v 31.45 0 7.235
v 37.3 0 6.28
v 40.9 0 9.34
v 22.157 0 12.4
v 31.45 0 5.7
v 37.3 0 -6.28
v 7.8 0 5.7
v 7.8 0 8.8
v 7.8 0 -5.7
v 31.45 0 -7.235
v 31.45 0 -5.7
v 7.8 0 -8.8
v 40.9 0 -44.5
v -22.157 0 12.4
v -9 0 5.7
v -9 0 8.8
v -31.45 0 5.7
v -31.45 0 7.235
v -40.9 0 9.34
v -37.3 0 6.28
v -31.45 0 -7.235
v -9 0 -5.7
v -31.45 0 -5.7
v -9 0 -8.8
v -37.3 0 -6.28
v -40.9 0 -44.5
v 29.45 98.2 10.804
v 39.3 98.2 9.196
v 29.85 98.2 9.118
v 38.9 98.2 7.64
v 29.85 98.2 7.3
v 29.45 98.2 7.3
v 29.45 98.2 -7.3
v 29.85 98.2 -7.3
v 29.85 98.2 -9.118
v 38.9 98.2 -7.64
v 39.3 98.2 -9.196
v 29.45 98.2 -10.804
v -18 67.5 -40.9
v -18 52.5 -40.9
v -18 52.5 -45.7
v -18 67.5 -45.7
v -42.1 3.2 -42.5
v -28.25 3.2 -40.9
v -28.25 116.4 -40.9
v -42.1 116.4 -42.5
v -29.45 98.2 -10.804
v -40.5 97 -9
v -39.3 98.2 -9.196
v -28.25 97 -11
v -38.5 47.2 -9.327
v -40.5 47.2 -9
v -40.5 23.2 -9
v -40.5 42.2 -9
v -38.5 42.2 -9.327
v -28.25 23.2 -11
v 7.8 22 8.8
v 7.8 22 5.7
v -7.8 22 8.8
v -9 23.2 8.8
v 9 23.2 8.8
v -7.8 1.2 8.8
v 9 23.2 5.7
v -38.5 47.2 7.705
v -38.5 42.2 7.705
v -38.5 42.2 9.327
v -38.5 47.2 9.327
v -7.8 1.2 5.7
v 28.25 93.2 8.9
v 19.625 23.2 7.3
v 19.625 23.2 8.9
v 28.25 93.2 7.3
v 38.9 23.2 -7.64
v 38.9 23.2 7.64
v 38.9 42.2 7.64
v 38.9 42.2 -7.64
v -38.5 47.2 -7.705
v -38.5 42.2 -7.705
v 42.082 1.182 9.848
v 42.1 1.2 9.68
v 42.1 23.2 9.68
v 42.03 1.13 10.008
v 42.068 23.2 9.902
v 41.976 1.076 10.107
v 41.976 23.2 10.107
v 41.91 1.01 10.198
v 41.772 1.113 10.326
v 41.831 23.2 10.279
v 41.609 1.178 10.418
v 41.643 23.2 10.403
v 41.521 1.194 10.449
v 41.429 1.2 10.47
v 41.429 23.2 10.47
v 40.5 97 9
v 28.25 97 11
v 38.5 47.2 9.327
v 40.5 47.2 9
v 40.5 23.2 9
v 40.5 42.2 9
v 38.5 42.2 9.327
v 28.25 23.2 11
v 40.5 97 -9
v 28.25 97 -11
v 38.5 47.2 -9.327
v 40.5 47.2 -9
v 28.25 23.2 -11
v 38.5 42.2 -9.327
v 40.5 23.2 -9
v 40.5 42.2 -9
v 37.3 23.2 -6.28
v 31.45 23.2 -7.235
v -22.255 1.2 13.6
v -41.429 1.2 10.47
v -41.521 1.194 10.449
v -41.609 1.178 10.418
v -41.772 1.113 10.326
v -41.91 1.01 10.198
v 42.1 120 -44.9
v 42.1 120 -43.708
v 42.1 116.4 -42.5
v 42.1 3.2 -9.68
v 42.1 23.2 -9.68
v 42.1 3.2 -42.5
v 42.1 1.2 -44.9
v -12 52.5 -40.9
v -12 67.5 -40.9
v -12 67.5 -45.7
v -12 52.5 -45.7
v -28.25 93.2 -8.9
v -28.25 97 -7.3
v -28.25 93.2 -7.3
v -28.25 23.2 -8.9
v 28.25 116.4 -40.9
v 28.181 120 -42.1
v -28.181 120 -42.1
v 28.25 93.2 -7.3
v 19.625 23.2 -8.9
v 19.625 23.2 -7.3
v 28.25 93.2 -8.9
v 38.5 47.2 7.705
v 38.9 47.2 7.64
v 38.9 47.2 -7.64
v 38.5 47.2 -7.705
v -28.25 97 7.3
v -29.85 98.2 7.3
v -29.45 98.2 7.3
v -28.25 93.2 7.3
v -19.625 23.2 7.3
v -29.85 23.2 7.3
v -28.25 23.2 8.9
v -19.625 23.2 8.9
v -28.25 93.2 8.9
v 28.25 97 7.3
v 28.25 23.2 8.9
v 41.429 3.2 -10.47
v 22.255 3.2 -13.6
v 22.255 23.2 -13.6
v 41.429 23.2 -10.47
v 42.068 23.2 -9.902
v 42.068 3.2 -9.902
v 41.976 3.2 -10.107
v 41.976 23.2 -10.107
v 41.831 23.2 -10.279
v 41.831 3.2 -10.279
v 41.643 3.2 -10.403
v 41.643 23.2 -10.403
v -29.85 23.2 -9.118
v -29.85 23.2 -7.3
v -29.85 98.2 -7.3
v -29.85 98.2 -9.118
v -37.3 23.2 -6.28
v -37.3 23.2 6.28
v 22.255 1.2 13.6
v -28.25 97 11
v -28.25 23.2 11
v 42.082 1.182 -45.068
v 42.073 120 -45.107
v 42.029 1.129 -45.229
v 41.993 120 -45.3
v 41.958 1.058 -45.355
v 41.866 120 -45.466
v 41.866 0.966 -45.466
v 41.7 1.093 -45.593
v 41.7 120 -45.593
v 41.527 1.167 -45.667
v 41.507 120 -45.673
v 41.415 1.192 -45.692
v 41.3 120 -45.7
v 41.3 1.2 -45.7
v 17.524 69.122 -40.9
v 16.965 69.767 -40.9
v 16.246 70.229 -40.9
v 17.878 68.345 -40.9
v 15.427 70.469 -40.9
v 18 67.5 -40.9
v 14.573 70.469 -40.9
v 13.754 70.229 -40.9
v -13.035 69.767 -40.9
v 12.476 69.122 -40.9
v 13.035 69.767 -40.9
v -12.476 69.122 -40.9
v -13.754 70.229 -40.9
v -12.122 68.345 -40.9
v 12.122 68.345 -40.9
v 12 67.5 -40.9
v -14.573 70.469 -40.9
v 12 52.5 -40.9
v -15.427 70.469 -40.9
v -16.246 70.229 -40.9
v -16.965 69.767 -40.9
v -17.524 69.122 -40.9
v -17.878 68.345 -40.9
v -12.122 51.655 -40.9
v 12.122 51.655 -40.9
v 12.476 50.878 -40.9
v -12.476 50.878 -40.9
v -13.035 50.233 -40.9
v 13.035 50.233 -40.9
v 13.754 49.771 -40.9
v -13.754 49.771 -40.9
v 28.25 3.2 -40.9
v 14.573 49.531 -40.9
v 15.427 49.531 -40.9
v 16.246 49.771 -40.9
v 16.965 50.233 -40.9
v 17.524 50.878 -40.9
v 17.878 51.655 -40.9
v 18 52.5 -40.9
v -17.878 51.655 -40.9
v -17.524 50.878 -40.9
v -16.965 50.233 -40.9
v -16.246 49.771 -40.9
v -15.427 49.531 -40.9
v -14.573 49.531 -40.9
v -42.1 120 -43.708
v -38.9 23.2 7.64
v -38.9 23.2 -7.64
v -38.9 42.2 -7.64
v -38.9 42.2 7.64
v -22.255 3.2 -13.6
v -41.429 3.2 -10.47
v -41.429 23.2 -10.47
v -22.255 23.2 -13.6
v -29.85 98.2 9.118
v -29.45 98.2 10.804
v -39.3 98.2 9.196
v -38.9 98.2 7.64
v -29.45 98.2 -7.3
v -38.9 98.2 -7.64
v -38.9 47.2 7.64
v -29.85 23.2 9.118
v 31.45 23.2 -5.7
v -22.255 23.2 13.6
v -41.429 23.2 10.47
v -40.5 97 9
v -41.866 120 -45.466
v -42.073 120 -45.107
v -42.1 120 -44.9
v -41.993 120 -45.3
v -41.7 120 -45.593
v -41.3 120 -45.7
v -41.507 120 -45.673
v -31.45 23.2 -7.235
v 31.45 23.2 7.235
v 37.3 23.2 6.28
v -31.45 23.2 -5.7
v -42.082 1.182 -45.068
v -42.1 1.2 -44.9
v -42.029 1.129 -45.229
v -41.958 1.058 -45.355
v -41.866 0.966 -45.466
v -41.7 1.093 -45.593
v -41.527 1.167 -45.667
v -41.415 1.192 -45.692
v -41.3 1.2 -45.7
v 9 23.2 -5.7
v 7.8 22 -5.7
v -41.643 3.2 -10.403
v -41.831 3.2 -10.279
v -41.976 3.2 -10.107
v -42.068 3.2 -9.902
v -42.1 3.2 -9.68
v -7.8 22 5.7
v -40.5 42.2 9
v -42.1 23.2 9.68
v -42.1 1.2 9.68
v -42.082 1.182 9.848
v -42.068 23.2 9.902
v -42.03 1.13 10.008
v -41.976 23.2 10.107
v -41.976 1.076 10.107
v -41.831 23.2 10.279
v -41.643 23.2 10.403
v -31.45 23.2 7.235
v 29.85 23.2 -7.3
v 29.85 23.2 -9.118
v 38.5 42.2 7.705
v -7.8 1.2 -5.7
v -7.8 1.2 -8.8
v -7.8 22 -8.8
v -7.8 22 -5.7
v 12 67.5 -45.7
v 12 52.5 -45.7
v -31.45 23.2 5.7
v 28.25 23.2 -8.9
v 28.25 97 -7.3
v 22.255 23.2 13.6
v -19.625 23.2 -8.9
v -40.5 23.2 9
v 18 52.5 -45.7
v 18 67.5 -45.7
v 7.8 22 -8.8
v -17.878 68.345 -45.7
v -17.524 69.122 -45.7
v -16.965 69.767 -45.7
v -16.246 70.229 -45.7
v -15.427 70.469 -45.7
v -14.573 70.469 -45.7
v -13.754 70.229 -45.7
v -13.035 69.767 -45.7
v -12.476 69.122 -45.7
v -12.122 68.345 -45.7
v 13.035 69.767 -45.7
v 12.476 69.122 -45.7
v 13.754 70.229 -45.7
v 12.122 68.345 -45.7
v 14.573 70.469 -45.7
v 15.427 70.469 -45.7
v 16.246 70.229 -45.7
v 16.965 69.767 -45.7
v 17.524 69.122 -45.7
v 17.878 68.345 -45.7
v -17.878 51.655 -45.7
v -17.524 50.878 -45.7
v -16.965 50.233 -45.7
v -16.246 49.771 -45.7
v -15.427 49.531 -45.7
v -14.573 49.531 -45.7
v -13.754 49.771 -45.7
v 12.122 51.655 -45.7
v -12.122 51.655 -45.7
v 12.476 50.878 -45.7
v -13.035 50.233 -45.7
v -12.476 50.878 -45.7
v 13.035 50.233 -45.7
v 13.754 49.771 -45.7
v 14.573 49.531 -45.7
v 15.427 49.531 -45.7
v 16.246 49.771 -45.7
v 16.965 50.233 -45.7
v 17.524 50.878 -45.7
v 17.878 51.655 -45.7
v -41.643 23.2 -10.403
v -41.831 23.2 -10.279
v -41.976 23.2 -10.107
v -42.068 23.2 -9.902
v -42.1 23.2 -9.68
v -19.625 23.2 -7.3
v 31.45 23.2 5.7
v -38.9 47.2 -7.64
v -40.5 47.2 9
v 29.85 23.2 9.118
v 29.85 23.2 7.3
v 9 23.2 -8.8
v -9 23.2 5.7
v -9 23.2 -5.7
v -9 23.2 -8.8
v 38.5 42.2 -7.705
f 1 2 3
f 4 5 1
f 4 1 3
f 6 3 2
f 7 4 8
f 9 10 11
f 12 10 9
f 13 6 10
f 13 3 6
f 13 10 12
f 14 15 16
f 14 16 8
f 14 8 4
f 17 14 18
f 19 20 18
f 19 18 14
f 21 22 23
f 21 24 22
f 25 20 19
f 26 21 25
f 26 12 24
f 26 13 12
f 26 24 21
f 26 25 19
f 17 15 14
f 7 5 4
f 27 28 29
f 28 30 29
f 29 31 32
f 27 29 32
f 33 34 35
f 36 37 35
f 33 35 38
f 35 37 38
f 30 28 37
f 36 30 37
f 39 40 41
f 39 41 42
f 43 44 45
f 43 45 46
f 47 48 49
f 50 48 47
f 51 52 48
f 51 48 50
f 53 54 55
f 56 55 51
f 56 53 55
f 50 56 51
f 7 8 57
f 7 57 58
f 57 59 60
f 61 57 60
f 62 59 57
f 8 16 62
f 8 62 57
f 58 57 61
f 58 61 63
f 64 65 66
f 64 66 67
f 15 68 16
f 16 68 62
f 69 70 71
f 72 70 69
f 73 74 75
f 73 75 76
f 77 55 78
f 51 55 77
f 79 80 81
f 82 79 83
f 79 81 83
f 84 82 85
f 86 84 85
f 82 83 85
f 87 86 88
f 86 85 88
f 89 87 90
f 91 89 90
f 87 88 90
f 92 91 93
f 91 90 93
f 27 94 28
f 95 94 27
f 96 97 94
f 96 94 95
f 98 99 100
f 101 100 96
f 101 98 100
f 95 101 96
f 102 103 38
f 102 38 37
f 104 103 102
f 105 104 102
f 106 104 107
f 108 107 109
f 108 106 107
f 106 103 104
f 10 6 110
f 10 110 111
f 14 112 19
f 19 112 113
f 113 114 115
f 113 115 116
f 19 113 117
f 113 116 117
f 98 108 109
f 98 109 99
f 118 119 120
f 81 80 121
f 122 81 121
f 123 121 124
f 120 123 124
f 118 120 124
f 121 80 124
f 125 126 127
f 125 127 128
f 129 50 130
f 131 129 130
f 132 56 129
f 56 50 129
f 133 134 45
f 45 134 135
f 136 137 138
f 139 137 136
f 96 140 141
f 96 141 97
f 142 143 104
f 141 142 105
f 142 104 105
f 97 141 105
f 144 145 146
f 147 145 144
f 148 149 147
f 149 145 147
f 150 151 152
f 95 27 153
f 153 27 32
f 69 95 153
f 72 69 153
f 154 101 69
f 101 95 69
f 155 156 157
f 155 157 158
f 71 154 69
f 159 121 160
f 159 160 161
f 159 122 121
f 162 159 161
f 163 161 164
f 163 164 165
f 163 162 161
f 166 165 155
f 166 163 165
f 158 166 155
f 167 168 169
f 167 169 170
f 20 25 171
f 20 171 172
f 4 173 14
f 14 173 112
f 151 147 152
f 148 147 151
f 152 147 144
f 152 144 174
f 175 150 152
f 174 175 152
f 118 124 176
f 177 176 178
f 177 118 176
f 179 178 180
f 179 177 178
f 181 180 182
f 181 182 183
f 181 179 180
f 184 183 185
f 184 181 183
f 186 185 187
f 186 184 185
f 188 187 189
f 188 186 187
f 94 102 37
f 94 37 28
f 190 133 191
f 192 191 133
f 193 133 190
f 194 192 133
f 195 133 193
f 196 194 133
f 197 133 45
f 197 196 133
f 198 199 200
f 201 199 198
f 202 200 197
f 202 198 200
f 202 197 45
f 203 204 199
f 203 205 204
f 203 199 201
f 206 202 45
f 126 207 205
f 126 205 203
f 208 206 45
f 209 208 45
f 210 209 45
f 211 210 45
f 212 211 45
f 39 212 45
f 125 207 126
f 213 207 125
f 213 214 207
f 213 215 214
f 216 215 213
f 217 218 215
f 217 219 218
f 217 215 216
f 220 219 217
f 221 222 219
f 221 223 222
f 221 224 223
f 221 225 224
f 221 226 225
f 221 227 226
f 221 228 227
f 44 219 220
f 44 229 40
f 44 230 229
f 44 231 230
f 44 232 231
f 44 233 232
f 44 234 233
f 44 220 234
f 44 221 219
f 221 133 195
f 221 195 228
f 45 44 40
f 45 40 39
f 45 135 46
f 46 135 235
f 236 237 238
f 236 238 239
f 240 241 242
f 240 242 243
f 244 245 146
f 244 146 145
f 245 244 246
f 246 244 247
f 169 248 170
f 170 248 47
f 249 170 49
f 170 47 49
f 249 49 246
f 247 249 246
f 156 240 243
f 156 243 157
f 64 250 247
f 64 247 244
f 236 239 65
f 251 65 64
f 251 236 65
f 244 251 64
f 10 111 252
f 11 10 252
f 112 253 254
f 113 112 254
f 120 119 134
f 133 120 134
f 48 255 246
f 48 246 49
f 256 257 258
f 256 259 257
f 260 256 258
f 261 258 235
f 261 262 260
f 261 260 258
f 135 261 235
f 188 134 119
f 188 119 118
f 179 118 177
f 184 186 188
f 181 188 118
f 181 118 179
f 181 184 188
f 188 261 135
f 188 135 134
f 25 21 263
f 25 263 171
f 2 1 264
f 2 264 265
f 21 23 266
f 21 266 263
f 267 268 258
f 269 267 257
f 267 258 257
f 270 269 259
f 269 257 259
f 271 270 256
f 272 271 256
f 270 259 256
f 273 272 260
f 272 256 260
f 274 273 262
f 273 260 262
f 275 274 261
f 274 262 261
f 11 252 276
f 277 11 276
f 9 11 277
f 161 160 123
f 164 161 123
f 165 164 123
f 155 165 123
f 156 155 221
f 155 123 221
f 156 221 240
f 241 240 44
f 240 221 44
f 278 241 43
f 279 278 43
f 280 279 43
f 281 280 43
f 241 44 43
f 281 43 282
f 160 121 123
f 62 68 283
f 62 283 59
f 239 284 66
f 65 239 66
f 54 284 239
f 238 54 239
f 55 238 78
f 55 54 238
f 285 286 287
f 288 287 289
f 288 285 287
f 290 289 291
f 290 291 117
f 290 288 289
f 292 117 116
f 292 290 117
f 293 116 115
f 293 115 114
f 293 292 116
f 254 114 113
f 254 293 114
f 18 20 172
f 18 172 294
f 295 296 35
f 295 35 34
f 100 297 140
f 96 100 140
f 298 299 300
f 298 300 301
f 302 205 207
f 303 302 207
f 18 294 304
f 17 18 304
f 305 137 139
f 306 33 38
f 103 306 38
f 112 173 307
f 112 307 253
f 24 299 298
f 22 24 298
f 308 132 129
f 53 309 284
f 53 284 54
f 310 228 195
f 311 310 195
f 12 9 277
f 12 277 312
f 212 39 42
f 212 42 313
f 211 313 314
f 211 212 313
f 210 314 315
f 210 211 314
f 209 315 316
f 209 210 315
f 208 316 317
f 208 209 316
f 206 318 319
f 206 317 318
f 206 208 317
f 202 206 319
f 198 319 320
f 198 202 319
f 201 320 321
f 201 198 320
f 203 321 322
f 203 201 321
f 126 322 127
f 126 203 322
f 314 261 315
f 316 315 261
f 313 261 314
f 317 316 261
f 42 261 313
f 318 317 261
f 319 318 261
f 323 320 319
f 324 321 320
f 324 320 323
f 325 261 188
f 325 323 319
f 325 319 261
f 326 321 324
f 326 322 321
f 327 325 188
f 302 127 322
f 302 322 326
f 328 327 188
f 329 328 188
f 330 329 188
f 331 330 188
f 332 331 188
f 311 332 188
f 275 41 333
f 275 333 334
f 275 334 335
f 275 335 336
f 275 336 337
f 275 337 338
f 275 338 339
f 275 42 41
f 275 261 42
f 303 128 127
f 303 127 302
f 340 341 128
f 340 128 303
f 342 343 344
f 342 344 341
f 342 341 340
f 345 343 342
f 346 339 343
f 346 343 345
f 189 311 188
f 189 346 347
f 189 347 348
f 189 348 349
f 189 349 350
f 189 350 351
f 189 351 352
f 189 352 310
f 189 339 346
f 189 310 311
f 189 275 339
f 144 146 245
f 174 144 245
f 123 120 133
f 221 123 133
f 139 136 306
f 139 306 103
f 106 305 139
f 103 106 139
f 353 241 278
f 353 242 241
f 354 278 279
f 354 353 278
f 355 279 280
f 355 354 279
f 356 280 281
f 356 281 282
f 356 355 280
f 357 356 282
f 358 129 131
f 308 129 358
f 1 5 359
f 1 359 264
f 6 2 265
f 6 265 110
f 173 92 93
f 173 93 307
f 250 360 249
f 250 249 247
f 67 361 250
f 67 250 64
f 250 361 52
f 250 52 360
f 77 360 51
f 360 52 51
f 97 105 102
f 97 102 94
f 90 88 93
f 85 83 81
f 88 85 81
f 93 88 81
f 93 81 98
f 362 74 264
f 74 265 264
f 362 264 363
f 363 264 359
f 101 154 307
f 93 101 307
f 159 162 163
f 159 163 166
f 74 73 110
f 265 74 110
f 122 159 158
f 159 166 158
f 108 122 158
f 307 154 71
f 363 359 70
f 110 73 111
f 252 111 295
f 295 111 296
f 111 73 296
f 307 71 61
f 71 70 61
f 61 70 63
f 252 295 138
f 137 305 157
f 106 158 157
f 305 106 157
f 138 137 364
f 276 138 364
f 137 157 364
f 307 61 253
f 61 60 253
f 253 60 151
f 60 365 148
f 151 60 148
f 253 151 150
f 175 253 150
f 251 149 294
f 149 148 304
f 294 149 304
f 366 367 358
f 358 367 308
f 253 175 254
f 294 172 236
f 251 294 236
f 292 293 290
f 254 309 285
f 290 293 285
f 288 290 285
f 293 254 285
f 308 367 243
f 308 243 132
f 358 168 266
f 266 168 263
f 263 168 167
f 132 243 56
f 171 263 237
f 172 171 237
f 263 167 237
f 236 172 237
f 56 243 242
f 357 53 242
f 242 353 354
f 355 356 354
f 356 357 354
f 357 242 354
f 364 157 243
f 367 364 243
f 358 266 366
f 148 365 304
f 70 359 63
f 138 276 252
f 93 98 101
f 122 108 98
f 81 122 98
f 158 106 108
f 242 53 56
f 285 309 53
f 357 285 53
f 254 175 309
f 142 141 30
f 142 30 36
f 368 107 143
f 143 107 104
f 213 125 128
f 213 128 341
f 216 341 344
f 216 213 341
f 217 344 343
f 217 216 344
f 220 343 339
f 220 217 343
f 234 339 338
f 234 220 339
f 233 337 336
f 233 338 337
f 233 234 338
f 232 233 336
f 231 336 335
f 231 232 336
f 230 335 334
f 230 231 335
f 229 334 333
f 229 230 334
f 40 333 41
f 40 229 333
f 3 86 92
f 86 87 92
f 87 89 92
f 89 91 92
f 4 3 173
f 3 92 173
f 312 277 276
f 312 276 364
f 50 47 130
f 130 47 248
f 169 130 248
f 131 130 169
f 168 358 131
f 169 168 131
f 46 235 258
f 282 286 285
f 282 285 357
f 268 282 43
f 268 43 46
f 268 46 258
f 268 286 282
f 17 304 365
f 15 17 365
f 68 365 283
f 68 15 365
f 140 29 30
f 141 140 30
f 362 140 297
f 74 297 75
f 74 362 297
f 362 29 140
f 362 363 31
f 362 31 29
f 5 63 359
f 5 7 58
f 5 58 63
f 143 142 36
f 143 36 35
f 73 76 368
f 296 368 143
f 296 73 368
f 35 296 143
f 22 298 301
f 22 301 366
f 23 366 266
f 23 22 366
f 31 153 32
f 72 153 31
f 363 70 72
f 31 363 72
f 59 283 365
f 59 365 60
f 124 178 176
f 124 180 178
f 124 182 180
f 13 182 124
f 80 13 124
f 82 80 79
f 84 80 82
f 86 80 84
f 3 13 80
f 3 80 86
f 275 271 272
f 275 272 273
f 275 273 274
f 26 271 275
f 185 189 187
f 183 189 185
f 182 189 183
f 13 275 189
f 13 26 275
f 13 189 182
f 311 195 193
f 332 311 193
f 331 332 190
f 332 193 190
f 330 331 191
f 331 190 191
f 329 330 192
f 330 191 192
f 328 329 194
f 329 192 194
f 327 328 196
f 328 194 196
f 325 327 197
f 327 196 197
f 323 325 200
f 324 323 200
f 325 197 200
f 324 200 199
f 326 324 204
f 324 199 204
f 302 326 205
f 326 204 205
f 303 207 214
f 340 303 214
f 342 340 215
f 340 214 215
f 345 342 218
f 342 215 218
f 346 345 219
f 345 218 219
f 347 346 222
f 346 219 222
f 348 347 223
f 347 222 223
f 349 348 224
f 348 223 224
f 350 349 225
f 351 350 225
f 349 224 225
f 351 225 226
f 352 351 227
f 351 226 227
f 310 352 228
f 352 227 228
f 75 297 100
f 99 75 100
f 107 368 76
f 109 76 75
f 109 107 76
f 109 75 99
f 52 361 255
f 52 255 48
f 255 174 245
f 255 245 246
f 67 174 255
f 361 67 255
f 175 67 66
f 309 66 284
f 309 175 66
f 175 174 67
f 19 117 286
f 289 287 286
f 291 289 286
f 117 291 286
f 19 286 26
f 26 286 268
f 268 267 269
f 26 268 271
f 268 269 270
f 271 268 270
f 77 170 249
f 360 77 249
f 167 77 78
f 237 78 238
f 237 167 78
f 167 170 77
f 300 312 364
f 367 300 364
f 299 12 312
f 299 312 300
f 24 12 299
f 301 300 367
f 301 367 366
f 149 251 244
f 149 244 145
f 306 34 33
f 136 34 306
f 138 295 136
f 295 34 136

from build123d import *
from OCP.BRepFilletAPI import BRepFilletAPI_MakeChamfer

# Parameters (mm, degrees)
BOSS_EXTRUDE1_DEPTH     = 23.2
BOSS_EXTRUDE2_START     = 23.2
BOSS_EXTRUDE2_DEPTH     = 75
CUT_EXTRUDE1_DEPTH      = 108.706127959
CUT_EXTRUDE1_DEPTH_BACK = 108.706127959
SKETCH2_W               = 2
SKETCH2_H               = 5
CUT_EXTRUDE2_DEPTH      = 108.706127959
CUT_EXTRUDE2_DEPTH_BACK = 108.706127959
CUT_EXTRUDE3_DEPTH      = 108.706127959
CUT_EXTRUDE3_DEPTH_BACK = 108.706127959
BOSS_EXTRUDE3_DEPTH     = 3.2
SKETCH5_W               = 84.2
SKETCH5_H               = 3.2
BOSS_EXTRUDE4_DEPTH     = 120
BOSS_EXTRUDE5_DEPTH     = 120
CUT_EXTRUDE4_DEPTH      = 136.132897549
CUT_EXTRUDE4_DEPTH_BACK = 136.132897549
CHAMFER1_SIZE           = 3.6
CHAMFER1_SIZE2          = 1.2
CHAMFER2_SIZE           = 1.2
FILLET1_R               = 0.8


with BuildPart() as part:
    # Sketch1 → Boss-Extrude1 (new body)
    with BuildSketch(Plane(origin=(0, 0, 0), x_dir=(1, 0, 0), z_dir=(0, 1, 0))):
        Polygon((-22.25475327, 13.6), (22.25475327, 13.6), (42.1, 10.359959718), (42.1, -10.359959718), (22.25475327, -13.6), (-22.25475327, -13.6), (-42.1, -10.359959718), (-42.1, 10.359959718), align=None)
    extrude(amount=BOSS_EXTRUDE1_DEPTH)

    # Sketch1<3> → Boss-Extrude2 (add)
    with BuildSketch(Plane(origin=(0, 0, 0), x_dir=(1, 0, 0), z_dir=(0, 1, 0)).offset(BOSS_EXTRUDE2_START)):
        Polygon((40.5, -9), (28.25, -11), (28.25, -8.9), (11, -8.9), (11, -12), (-11, -12), (-11, -8.9), (-28.25, -8.9), (-28.25, -11), (-40.5, -9), (-40.5, 9), (-28.25, 11), (-28.25, 8.9), (-11, 8.9), (-11, 12), (11, 12), (11, 8.9), (28.25, 8.9), (28.25, 11), (40.5, 9), align=None)
        Polygon((-38.9, -7.640040282), (-29.85, -9.117591303), (-29.85, -7.3), (-9.4, -7.3), (-9.4, -10.4), (9.4, -10.4), (9.4, -7.3), (29.85, -7.3), (29.85, -9.117591303), (38.9, -7.640040282), (38.9, 7.640040282), (29.85, 9.117591303), (29.85, 7.3), (9.4, 7.3), (9.4, 10.4), (-9.4, 10.4), (-9.4, 7.3), (-29.85, 7.3), (-29.85, 9.117591303), (-38.9, 7.640040282), align=None, mode=Mode.SUBTRACT)
    extrude(amount=BOSS_EXTRUDE2_DEPTH)

    # Sketch2 → Cut-Extrude1 (cut, two sides: drawn at the far end of the back side and taken through both)
    with BuildSketch(Plane.XY.offset(-CUT_EXTRUDE1_DEPTH_BACK)):
        with Locations((-39.5, 44.7)):
            Rectangle(SKETCH2_W, SKETCH2_H)
        with Locations((39.5, 44.7)):
            Rectangle(SKETCH2_W, SKETCH2_H)
    extrude(amount=CUT_EXTRUDE1_DEPTH + CUT_EXTRUDE1_DEPTH_BACK, mode=Mode.SUBTRACT)

    # Sketch3 → Cut-Extrude2 (cut, two sides: drawn at the far end of the back side and taken through both)
    with BuildSketch(Plane.XY.offset(-CUT_EXTRUDE2_DEPTH_BACK)):
        Polygon((-28.25, 93.2), (-19.625, 23.2), (19.625, 23.2), (28.25, 93.2), (28.25, 98.2), (-28.25, 98.2), align=None)
    extrude(amount=CUT_EXTRUDE2_DEPTH + CUT_EXTRUDE2_DEPTH_BACK, mode=Mode.SUBTRACT)

    # Sketch1<4> → Cut-Extrude3 (cut, two sides: drawn at the far end of the back side and taken through both)
    with BuildSketch(Plane(origin=(0, 0, 0), x_dir=(1, 0, 0), z_dir=(0, 1, 0)).offset(-CUT_EXTRUDE3_DEPTH_BACK)):
        Polygon((-31.45, -5.7), (-7.8, -5.7), (-7.8, -8.8), (7.8, -8.8), (7.8, -5.7), (31.45, -5.7), (31.45, -7.235182606), (37.3, -6.280080565), (37.3, 6.280080565), (31.45, 7.235182606), (31.45, 5.7), (7.8, 5.7), (7.8, 8.8), (-7.8, 8.8), (-7.8, 5.7), (-31.45, 5.7), (-31.45, 7.235182606), (-37.3, 6.280080565), (-37.3, -6.280080565), (-31.45, -7.235182606), align=None)
    extrude(amount=CUT_EXTRUDE3_DEPTH + CUT_EXTRUDE3_DEPTH_BACK, mode=Mode.SUBTRACT)

    # Sketch4 → Boss-Extrude3 (add)
    with BuildSketch(Plane(origin=(0, 0, 0), x_dir=(1, 0, 0), z_dir=(0, 1, 0))):
        Polygon((42.1, 10.359959718), (22.25475327, 13.6), (-22.25475327, 13.6), (-42.1, 10.359959718), (-42.1, 42.5), (42.1, 42.5), align=None)
    extrude(amount=BOSS_EXTRUDE3_DEPTH)

    # Sketch5 → Boss-Extrude4 (add)
    with BuildSketch(Plane(origin=(0, 0, 0), x_dir=(1, 0, 0), z_dir=(0, 1, 0))):
        with Locations((0, 44.1)):
            Rectangle(SKETCH5_W, SKETCH5_H)
    extrude(amount=BOSS_EXTRUDE4_DEPTH)

    # Sketch6 → Boss-Extrude5 (add)
    with BuildSketch(Plane(origin=(0, 0, 0), x_dir=(1, 0, 0), z_dir=(0, 1, 0))):
        Polygon((-42.1, 42.5), (42.1, 42.5), (28.25, 40.9), (-28.25, 40.9), align=None)
    extrude(amount=BOSS_EXTRUDE5_DEPTH)

    # Sketch7 → Cut-Extrude4 (cut, two sides: drawn at the far end of the back side and taken through both)
    with BuildSketch(Plane(origin=(0, 0, 0), x_dir=(-1, 0, 0), z_dir=(0, 0, -1)).offset(-CUT_EXTRUDE4_DEPTH_BACK)):
        with BuildLine():
            Line((-12, 67.5), (-12, 52.5))
            ThreePointArc((-12, 52.5), (-15, 49.5), (-18, 52.5))
            Line((-18, 52.5), (-18, 67.5))
            ThreePointArc((-18, 67.5), (-15, 70.5), (-12, 67.5))
        make_face()
        with BuildLine():
            Line((12, 67.5), (12, 52.5))
            ThreePointArc((12, 52.5), (15, 49.5), (18, 52.5))
            Line((18, 52.5), (18, 67.5))
            ThreePointArc((18, 67.5), (15, 70.5), (12, 67.5))
        make_face()
    extrude(amount=CUT_EXTRUDE4_DEPTH + CUT_EXTRUDE4_DEPTH_BACK, mode=Mode.SUBTRACT)

    # Chamfer1: one chamfer whose edges measure the first distance from different faces: ONE call of the kernel's chamfer builder (chamfer() names one face for all edges)
    chamfer1_edges_1 = [part.edges().sort_by_distance(p)[0] for p in [
        (35.175, 120, -41.7),
    ]]
    chamfer1_side_1 = [part.faces().sort_by_distance(p)[0] for p in [
        (35.175, 61.6, -41.7),
    ]]
    chamfer1_edges_2 = [part.edges().sort_by_distance(p)[0] for p in [
        (0, 120, -40.9),
    ]]
    chamfer1_side_2 = [part.faces().sort_by_distance(p)[0] for p in [
        (0, 61.659484301, -40.9),
    ]]
    chamfer1_edges_3 = [part.edges().sort_by_distance(p)[0] for p in [
        (-35.175, 120, -41.7),
    ]]
    chamfer1_side_3 = [part.faces().sort_by_distance(p)[0] for p in [
        (-35.175, 61.6, -41.7),
    ]]
    chamfer1 = BRepFilletAPI_MakeChamfer(part.part.solid().wrapped)
    for e in chamfer1_edges_1:
        chamfer1.Add(CHAMFER1_SIZE, CHAMFER1_SIZE2, e.wrapped, chamfer1_side_1[0].wrapped)  # the first distance lies on this face
    for e in chamfer1_edges_2:
        chamfer1.Add(CHAMFER1_SIZE, CHAMFER1_SIZE2, e.wrapped, chamfer1_side_2[0].wrapped)  # the first distance lies on this face
    for e in chamfer1_edges_3:
        chamfer1.Add(CHAMFER1_SIZE, CHAMFER1_SIZE2, e.wrapped, chamfer1_side_3[0].wrapped)  # the first distance lies on this face
    add(Compound.cast(chamfer1.Shape()), mode=Mode.REPLACE)

    # Chamfer2
    chamfer2_edges = [part.edges().sort_by_distance(p)[0] for p in [
        (-42.1, 0, -17.670020141),
        (-7.8, 23.2, 7.25),
        (7.8, 23.2, 7.25),
        (7.8, 23.2, -7.25),
        (-7.8, 23.2, -7.25),
        (-7.8, 0, -7.25),
        (-7.8, 0, 7.25),
        (40.5, 98.2, 0),
        (28.25, 98.2, -9.15),
        (0, 0, -45.7),
        (-28.25, 98.2, 9.15),
        (28.25, 98.2, 9.15),
        (-28.25, 98.2, -9.15),
        (-40.5, 98.2, 0),
        (-32.177376635, 0, 11.979979859),
        (0, 0, 13.6),
        (32.177376635, 0, 11.979979859),
        (42.1, 0, -17.670020141),
    ]]
    chamfer(chamfer2_edges, length=CHAMFER2_SIZE)

    # Fillet1
    fillet1_edges = [part.edges().sort_by_distance(p)[0] for p in [
        (-42.1, 12.2, 10.359959718),
        (42.1, 12.2, 10.359959718),
        (42.1, 13.2, -10.359959718),
        (-42.1, 13.2, -10.359959718),
        (-42.1, 60.6, -45.7),
        (42.1, 60.6, -45.7),
    ]]
    fillet(fillet1_edges, radius=FILLET1_R)


solid = part.part
